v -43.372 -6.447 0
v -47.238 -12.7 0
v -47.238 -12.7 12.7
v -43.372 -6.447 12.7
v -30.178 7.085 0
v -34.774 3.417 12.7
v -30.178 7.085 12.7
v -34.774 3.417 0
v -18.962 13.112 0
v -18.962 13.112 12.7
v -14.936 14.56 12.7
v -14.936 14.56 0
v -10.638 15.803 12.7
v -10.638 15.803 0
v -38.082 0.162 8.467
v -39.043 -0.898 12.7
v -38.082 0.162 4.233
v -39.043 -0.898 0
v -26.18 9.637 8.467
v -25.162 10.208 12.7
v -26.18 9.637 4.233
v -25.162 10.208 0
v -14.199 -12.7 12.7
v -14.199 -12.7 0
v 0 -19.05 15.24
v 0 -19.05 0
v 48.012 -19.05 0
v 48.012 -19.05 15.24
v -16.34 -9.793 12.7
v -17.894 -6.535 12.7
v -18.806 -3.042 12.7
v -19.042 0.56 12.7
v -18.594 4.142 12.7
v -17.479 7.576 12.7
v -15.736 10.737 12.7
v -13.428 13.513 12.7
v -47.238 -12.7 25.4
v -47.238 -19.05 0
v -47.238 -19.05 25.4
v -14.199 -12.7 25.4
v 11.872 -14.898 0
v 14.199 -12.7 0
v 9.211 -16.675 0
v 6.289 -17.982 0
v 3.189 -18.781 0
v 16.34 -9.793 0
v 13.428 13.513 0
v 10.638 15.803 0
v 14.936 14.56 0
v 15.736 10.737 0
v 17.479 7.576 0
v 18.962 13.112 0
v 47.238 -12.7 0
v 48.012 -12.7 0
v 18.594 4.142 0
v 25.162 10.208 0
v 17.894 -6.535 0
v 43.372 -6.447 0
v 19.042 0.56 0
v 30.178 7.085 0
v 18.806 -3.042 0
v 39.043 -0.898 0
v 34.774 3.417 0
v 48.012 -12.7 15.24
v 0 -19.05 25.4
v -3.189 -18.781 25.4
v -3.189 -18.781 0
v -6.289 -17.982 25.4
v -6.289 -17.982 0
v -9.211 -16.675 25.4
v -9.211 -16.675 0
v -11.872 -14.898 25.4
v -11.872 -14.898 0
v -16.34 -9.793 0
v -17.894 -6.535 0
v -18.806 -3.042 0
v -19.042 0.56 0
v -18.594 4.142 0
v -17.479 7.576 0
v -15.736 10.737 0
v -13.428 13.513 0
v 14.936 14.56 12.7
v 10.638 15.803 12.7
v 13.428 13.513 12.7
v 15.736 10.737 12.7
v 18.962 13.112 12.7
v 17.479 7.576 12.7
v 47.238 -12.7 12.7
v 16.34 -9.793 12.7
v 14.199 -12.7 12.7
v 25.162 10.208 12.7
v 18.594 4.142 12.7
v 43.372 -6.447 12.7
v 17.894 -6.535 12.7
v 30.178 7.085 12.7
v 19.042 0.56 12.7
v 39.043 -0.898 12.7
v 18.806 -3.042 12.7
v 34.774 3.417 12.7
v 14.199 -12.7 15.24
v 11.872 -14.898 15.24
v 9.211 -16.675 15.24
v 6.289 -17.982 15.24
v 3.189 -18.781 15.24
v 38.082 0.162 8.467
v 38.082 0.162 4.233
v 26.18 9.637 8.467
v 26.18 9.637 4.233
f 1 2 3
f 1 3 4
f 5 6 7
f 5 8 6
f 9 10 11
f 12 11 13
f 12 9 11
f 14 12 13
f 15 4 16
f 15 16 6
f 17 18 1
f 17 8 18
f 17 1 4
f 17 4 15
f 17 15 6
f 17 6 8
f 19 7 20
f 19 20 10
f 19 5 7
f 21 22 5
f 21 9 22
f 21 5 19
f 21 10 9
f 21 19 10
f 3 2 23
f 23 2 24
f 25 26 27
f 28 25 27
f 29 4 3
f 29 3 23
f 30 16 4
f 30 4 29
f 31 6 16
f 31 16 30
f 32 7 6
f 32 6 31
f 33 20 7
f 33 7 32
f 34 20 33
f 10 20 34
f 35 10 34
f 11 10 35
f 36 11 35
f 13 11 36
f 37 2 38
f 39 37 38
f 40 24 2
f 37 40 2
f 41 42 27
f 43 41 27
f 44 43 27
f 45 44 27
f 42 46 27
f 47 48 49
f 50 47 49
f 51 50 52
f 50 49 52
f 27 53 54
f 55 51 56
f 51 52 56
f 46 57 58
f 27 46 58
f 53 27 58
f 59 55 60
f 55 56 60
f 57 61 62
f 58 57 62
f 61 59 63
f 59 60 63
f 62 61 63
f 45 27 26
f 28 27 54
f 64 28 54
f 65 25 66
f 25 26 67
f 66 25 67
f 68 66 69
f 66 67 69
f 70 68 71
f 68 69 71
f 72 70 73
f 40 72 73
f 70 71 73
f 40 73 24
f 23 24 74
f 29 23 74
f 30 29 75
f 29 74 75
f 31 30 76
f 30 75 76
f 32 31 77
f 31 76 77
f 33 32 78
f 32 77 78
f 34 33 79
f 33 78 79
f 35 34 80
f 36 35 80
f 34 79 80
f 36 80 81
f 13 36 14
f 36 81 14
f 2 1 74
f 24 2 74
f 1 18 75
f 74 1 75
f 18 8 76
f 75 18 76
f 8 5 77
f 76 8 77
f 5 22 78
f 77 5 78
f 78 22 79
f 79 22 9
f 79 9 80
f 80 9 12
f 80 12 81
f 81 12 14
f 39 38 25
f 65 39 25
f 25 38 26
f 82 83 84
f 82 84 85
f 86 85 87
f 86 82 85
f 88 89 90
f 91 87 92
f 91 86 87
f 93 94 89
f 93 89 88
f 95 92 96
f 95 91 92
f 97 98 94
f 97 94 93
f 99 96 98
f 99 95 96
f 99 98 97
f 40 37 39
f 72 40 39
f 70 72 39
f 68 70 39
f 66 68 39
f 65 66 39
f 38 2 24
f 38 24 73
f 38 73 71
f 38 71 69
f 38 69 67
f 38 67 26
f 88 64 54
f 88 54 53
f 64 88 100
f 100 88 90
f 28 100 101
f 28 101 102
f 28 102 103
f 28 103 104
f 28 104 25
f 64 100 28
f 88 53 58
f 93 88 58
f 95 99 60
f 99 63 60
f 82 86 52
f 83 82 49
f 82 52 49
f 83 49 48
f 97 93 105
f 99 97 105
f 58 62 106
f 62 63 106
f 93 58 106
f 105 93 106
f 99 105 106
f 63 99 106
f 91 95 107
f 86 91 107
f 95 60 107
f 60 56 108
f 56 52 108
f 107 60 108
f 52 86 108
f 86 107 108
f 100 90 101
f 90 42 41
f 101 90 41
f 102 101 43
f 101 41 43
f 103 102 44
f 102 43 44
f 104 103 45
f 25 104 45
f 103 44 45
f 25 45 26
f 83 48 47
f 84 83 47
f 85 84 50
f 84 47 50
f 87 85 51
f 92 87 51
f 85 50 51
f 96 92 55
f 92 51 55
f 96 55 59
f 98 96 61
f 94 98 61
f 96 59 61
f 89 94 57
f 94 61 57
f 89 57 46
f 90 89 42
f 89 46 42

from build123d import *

# Parameters (mm, degrees)
F1_DEPTH = 12.7
F2_DEPTH = 25.4
F3_DEPTH = 15.24


with BuildPart() as f1:
    # F0 (on Top) → F1 (new body)
    with BuildSketch(Plane.XY):
        with BuildLine():
            ThreePointArc((10.6376512064, 15.8032552599), (18.9030181193, 2.361864937), (14.1990316571, -12.7))
            Line((14.1990316571, -12.7), (47.2384188172, -12.7))
            add(Edge.make_bspline(
                [(47.2384188172, -12.7), (39.1575731337, 1.8808549503), (28.2982736826, 11.2654352561), (10.6376512064, 15.8032552599)],
                knots=[0, 0, 0, 0, 46.3902117921, 46.3902117921, 46.3902117921, 46.3902117921], degree=3))
        make_face()
    extrude(amount=F1_DEPTH)



with BuildPart() as f1b:
    # F0 (on Top) → F1, piece 2 (new body)
    with BuildSketch(Plane.XY):
        with BuildLine():
            ThreePointArc((-14.1990316571, -12.7), (-18.9030181193, 2.361864937), (-10.6376512064, 15.8032552599))
            add(Edge.make_bspline(
                [(-47.2384188172, -12.7), (-39.1575731337, 1.8808549503), (-28.2982736826, 11.2654352561), (-10.6376512064, 15.8032552599)],
                knots=[0, 0, 0, 0, 46.3902117921, 46.3902117921, 46.3902117921, 46.3902117921], degree=3))
            Line((-47.2384188172, -12.7), (-14.1990316571, -12.7))
        make_face()
    extrude(amount=F1_DEPTH)


with BuildPart() as f2:
    # F0 (on Top) → F2 (new body)
    with BuildSketch(Plane.XY):
        with BuildLine():
            ThreePointArc((0, -19.05), (-7.7771299333, -17.3901912008), (-14.1990316571, -12.7))
            Line((-14.1990316571, -12.7), (-47.2384188172, -12.7))
            Line((-47.2384188172, -12.7), (-47.2384188172, -19.05))
            Line((-47.2384188172, -19.05), (0, -19.05))
        make_face()
    extrude(amount=F2_DEPTH)


with BuildPart() as f1_1:
    add(f1.part)

    add(f2.part)  # F3 merges F2
    # F0 (on Top) → F3 (join)
    with BuildSketch(Plane.XY):
        with BuildLine():
            ThreePointArc((14.1990316571, -12.7), (7.7771299333, -17.3901912008), (0, -19.05))
            Line((0, -19.05), (48.0115811828, -19.05))
            Line((48.0115811828, -19.05), (48.0115811828, -12.7))
            Line((48.0115811828, -12.7), (47.2384188172, -12.7))
            Line((47.2384188172, -12.7), (14.1990316571, -12.7))
        make_face()
    extrude(amount=F3_DEPTH)


solid = Compound([f1b.part, f1_1.part])
